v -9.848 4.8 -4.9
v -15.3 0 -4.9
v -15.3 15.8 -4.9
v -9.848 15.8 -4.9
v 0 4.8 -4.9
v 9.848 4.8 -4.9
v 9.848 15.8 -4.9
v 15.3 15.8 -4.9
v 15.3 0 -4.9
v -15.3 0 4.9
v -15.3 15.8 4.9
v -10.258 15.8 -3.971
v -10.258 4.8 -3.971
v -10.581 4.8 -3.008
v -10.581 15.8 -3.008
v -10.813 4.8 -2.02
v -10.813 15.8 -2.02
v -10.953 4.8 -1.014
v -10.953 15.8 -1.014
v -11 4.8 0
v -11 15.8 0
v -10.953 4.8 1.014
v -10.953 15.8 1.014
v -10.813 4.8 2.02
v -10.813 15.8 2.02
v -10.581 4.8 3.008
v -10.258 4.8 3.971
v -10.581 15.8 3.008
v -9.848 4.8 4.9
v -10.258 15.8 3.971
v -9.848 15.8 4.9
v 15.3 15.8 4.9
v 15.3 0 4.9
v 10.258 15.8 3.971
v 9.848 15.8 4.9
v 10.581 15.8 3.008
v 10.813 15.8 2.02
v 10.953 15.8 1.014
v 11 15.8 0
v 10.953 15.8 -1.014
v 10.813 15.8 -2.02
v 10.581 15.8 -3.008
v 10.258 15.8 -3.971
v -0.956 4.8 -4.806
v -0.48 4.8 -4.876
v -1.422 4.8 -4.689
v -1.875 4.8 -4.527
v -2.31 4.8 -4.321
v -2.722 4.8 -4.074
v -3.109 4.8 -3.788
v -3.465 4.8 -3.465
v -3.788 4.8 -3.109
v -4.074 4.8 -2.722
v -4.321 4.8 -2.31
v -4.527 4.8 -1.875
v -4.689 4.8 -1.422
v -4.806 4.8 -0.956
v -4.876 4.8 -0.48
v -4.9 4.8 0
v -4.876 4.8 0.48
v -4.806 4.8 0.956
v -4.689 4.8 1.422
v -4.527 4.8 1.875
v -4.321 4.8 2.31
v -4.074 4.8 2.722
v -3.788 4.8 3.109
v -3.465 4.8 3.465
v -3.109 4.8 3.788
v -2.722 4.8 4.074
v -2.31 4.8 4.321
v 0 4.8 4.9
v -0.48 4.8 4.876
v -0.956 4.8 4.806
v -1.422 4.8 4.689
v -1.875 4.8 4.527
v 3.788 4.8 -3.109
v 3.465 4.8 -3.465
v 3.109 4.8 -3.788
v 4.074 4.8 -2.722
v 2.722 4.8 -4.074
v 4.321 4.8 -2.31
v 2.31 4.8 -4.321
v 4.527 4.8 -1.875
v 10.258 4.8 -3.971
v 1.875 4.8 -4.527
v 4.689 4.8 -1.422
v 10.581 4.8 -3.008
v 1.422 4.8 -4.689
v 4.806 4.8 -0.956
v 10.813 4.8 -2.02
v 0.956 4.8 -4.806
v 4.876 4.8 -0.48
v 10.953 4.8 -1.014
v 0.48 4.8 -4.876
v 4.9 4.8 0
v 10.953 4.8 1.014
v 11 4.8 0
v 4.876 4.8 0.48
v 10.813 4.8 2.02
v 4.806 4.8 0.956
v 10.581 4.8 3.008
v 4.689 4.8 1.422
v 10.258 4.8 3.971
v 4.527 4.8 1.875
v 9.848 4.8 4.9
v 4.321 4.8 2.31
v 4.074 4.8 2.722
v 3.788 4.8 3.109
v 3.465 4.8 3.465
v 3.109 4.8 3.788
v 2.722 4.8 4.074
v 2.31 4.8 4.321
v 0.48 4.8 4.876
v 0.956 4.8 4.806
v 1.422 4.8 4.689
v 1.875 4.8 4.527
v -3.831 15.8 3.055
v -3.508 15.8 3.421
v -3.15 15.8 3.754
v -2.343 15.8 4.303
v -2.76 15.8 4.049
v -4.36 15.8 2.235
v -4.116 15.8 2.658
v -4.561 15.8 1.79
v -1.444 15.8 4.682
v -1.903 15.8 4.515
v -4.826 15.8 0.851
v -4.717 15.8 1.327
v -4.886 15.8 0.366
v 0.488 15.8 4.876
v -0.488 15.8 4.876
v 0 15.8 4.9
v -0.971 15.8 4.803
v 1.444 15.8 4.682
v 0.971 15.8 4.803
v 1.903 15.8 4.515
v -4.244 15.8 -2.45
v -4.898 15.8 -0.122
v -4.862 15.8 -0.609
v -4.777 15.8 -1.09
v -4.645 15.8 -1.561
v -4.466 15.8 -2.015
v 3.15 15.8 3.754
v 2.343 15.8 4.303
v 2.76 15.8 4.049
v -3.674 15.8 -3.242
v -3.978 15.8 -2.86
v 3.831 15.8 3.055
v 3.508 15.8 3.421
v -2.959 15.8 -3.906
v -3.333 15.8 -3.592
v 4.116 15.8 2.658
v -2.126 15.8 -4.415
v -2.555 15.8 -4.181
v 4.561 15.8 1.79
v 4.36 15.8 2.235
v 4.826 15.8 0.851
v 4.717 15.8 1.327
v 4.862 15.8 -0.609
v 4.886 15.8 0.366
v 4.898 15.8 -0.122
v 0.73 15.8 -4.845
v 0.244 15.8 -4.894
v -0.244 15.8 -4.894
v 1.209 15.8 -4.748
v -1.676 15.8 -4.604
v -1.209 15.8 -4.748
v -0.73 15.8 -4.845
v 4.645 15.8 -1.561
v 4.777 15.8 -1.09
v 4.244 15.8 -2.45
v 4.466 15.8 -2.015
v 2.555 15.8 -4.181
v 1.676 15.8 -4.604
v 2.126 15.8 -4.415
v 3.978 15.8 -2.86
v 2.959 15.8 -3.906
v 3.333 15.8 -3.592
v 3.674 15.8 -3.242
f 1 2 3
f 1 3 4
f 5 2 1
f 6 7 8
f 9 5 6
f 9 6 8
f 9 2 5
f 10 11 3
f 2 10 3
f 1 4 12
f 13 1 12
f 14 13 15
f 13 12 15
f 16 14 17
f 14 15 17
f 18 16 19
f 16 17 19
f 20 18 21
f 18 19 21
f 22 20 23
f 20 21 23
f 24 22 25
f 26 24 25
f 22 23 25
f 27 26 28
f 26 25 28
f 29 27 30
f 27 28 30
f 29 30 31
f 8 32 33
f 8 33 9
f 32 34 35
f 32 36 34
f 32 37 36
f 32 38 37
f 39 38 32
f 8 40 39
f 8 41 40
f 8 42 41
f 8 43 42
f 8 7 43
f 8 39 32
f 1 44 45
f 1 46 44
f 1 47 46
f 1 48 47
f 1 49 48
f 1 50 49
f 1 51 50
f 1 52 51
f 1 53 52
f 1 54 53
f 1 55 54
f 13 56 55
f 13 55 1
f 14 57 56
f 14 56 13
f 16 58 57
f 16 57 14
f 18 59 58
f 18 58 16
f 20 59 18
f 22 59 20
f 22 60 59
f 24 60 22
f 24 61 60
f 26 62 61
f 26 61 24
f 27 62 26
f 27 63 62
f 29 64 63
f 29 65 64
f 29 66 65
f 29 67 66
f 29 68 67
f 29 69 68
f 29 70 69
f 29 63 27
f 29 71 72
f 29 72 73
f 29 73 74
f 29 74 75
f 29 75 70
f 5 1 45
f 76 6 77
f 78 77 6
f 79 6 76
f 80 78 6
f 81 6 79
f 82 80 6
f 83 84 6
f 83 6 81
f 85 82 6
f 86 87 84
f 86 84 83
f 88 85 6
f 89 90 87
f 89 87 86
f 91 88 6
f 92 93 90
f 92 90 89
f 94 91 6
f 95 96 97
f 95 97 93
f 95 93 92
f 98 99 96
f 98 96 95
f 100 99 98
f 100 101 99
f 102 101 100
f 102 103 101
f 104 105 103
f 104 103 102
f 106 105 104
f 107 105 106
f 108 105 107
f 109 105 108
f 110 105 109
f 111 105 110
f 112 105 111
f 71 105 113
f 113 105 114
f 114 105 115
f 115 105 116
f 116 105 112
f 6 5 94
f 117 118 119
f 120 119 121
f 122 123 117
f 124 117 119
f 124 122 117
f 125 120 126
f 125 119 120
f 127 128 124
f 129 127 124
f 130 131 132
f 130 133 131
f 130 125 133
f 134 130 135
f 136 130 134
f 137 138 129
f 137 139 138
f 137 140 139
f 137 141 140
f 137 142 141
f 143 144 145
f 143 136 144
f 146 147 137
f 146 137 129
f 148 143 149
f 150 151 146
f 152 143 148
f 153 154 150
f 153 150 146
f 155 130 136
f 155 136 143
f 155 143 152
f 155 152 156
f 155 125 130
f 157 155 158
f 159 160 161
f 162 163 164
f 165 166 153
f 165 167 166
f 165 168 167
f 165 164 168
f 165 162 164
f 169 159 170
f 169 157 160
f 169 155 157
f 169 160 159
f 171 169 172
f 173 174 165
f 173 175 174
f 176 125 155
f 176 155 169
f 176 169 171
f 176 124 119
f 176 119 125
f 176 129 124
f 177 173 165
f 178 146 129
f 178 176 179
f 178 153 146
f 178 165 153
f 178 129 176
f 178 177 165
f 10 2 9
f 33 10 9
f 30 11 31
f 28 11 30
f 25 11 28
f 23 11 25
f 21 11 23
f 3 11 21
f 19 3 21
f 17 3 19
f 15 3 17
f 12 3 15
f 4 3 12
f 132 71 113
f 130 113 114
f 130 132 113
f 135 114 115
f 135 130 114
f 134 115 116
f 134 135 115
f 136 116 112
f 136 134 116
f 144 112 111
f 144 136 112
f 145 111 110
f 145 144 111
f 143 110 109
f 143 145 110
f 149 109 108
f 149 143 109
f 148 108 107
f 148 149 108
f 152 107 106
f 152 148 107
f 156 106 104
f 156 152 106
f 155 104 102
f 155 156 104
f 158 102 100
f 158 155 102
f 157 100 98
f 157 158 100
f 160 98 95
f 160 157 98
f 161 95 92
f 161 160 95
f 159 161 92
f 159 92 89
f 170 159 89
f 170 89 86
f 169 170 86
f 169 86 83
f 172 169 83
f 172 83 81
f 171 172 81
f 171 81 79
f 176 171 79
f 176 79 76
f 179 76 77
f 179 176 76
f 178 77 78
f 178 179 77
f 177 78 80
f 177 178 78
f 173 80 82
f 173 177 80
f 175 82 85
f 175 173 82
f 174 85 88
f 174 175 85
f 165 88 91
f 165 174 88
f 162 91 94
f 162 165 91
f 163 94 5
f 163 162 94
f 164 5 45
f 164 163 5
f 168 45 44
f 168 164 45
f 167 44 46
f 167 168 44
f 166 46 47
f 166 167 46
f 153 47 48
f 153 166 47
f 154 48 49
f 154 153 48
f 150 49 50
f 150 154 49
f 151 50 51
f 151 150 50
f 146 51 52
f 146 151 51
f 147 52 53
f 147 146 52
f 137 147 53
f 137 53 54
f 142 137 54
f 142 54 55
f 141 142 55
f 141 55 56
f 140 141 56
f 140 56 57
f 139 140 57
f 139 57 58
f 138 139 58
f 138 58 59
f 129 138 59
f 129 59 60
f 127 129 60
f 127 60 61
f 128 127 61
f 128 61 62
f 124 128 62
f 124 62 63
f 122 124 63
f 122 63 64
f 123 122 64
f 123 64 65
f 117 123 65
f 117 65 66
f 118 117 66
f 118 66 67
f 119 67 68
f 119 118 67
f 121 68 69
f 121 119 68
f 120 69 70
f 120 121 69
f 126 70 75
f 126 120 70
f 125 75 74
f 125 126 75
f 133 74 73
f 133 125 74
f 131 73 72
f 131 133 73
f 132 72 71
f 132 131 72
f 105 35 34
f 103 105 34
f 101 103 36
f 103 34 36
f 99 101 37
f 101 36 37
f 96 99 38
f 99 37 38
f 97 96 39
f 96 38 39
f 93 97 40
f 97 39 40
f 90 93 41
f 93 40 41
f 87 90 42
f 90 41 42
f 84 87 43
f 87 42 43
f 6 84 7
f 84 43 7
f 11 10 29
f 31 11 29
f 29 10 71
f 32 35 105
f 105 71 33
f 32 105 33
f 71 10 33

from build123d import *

# Parameters (mm, degrees)
SKETCH1_W          = 30.6
SKETCH1_H          = 9.8
BASE_EXTRUDE_DEPTH = 15.8
SKETCH2_R          = 11
SKETCH2_R_2        = 4.9
CUT_EXTRUDE1_DEPTH = 11


with BuildPart() as part:
    # Sketch1 → Base-Extrude (new body)
    with BuildSketch(Plane(origin=(0, 0, 0), x_dir=(1, 0, 0), z_dir=(0, 1, 0))):
        Rectangle(SKETCH1_W, SKETCH1_H)
    extrude(amount=BASE_EXTRUDE_DEPTH)

    # Sketch2 → Cut-Extrude1 (cut)
    with BuildSketch(Plane(origin=(0, 15.8, 0), x_dir=(-1, 0, 0), z_dir=(0, 1, 0))):
        Circle(SKETCH2_R)
        with Locations(Location((0, 0, 0), (0, 0, 90))):
            Circle(SKETCH2_R_2, mode=Mode.SUBTRACT)
    extrude(amount=-CUT_EXTRUDE1_DEPTH, mode=Mode.SUBTRACT)


solid = part.part
